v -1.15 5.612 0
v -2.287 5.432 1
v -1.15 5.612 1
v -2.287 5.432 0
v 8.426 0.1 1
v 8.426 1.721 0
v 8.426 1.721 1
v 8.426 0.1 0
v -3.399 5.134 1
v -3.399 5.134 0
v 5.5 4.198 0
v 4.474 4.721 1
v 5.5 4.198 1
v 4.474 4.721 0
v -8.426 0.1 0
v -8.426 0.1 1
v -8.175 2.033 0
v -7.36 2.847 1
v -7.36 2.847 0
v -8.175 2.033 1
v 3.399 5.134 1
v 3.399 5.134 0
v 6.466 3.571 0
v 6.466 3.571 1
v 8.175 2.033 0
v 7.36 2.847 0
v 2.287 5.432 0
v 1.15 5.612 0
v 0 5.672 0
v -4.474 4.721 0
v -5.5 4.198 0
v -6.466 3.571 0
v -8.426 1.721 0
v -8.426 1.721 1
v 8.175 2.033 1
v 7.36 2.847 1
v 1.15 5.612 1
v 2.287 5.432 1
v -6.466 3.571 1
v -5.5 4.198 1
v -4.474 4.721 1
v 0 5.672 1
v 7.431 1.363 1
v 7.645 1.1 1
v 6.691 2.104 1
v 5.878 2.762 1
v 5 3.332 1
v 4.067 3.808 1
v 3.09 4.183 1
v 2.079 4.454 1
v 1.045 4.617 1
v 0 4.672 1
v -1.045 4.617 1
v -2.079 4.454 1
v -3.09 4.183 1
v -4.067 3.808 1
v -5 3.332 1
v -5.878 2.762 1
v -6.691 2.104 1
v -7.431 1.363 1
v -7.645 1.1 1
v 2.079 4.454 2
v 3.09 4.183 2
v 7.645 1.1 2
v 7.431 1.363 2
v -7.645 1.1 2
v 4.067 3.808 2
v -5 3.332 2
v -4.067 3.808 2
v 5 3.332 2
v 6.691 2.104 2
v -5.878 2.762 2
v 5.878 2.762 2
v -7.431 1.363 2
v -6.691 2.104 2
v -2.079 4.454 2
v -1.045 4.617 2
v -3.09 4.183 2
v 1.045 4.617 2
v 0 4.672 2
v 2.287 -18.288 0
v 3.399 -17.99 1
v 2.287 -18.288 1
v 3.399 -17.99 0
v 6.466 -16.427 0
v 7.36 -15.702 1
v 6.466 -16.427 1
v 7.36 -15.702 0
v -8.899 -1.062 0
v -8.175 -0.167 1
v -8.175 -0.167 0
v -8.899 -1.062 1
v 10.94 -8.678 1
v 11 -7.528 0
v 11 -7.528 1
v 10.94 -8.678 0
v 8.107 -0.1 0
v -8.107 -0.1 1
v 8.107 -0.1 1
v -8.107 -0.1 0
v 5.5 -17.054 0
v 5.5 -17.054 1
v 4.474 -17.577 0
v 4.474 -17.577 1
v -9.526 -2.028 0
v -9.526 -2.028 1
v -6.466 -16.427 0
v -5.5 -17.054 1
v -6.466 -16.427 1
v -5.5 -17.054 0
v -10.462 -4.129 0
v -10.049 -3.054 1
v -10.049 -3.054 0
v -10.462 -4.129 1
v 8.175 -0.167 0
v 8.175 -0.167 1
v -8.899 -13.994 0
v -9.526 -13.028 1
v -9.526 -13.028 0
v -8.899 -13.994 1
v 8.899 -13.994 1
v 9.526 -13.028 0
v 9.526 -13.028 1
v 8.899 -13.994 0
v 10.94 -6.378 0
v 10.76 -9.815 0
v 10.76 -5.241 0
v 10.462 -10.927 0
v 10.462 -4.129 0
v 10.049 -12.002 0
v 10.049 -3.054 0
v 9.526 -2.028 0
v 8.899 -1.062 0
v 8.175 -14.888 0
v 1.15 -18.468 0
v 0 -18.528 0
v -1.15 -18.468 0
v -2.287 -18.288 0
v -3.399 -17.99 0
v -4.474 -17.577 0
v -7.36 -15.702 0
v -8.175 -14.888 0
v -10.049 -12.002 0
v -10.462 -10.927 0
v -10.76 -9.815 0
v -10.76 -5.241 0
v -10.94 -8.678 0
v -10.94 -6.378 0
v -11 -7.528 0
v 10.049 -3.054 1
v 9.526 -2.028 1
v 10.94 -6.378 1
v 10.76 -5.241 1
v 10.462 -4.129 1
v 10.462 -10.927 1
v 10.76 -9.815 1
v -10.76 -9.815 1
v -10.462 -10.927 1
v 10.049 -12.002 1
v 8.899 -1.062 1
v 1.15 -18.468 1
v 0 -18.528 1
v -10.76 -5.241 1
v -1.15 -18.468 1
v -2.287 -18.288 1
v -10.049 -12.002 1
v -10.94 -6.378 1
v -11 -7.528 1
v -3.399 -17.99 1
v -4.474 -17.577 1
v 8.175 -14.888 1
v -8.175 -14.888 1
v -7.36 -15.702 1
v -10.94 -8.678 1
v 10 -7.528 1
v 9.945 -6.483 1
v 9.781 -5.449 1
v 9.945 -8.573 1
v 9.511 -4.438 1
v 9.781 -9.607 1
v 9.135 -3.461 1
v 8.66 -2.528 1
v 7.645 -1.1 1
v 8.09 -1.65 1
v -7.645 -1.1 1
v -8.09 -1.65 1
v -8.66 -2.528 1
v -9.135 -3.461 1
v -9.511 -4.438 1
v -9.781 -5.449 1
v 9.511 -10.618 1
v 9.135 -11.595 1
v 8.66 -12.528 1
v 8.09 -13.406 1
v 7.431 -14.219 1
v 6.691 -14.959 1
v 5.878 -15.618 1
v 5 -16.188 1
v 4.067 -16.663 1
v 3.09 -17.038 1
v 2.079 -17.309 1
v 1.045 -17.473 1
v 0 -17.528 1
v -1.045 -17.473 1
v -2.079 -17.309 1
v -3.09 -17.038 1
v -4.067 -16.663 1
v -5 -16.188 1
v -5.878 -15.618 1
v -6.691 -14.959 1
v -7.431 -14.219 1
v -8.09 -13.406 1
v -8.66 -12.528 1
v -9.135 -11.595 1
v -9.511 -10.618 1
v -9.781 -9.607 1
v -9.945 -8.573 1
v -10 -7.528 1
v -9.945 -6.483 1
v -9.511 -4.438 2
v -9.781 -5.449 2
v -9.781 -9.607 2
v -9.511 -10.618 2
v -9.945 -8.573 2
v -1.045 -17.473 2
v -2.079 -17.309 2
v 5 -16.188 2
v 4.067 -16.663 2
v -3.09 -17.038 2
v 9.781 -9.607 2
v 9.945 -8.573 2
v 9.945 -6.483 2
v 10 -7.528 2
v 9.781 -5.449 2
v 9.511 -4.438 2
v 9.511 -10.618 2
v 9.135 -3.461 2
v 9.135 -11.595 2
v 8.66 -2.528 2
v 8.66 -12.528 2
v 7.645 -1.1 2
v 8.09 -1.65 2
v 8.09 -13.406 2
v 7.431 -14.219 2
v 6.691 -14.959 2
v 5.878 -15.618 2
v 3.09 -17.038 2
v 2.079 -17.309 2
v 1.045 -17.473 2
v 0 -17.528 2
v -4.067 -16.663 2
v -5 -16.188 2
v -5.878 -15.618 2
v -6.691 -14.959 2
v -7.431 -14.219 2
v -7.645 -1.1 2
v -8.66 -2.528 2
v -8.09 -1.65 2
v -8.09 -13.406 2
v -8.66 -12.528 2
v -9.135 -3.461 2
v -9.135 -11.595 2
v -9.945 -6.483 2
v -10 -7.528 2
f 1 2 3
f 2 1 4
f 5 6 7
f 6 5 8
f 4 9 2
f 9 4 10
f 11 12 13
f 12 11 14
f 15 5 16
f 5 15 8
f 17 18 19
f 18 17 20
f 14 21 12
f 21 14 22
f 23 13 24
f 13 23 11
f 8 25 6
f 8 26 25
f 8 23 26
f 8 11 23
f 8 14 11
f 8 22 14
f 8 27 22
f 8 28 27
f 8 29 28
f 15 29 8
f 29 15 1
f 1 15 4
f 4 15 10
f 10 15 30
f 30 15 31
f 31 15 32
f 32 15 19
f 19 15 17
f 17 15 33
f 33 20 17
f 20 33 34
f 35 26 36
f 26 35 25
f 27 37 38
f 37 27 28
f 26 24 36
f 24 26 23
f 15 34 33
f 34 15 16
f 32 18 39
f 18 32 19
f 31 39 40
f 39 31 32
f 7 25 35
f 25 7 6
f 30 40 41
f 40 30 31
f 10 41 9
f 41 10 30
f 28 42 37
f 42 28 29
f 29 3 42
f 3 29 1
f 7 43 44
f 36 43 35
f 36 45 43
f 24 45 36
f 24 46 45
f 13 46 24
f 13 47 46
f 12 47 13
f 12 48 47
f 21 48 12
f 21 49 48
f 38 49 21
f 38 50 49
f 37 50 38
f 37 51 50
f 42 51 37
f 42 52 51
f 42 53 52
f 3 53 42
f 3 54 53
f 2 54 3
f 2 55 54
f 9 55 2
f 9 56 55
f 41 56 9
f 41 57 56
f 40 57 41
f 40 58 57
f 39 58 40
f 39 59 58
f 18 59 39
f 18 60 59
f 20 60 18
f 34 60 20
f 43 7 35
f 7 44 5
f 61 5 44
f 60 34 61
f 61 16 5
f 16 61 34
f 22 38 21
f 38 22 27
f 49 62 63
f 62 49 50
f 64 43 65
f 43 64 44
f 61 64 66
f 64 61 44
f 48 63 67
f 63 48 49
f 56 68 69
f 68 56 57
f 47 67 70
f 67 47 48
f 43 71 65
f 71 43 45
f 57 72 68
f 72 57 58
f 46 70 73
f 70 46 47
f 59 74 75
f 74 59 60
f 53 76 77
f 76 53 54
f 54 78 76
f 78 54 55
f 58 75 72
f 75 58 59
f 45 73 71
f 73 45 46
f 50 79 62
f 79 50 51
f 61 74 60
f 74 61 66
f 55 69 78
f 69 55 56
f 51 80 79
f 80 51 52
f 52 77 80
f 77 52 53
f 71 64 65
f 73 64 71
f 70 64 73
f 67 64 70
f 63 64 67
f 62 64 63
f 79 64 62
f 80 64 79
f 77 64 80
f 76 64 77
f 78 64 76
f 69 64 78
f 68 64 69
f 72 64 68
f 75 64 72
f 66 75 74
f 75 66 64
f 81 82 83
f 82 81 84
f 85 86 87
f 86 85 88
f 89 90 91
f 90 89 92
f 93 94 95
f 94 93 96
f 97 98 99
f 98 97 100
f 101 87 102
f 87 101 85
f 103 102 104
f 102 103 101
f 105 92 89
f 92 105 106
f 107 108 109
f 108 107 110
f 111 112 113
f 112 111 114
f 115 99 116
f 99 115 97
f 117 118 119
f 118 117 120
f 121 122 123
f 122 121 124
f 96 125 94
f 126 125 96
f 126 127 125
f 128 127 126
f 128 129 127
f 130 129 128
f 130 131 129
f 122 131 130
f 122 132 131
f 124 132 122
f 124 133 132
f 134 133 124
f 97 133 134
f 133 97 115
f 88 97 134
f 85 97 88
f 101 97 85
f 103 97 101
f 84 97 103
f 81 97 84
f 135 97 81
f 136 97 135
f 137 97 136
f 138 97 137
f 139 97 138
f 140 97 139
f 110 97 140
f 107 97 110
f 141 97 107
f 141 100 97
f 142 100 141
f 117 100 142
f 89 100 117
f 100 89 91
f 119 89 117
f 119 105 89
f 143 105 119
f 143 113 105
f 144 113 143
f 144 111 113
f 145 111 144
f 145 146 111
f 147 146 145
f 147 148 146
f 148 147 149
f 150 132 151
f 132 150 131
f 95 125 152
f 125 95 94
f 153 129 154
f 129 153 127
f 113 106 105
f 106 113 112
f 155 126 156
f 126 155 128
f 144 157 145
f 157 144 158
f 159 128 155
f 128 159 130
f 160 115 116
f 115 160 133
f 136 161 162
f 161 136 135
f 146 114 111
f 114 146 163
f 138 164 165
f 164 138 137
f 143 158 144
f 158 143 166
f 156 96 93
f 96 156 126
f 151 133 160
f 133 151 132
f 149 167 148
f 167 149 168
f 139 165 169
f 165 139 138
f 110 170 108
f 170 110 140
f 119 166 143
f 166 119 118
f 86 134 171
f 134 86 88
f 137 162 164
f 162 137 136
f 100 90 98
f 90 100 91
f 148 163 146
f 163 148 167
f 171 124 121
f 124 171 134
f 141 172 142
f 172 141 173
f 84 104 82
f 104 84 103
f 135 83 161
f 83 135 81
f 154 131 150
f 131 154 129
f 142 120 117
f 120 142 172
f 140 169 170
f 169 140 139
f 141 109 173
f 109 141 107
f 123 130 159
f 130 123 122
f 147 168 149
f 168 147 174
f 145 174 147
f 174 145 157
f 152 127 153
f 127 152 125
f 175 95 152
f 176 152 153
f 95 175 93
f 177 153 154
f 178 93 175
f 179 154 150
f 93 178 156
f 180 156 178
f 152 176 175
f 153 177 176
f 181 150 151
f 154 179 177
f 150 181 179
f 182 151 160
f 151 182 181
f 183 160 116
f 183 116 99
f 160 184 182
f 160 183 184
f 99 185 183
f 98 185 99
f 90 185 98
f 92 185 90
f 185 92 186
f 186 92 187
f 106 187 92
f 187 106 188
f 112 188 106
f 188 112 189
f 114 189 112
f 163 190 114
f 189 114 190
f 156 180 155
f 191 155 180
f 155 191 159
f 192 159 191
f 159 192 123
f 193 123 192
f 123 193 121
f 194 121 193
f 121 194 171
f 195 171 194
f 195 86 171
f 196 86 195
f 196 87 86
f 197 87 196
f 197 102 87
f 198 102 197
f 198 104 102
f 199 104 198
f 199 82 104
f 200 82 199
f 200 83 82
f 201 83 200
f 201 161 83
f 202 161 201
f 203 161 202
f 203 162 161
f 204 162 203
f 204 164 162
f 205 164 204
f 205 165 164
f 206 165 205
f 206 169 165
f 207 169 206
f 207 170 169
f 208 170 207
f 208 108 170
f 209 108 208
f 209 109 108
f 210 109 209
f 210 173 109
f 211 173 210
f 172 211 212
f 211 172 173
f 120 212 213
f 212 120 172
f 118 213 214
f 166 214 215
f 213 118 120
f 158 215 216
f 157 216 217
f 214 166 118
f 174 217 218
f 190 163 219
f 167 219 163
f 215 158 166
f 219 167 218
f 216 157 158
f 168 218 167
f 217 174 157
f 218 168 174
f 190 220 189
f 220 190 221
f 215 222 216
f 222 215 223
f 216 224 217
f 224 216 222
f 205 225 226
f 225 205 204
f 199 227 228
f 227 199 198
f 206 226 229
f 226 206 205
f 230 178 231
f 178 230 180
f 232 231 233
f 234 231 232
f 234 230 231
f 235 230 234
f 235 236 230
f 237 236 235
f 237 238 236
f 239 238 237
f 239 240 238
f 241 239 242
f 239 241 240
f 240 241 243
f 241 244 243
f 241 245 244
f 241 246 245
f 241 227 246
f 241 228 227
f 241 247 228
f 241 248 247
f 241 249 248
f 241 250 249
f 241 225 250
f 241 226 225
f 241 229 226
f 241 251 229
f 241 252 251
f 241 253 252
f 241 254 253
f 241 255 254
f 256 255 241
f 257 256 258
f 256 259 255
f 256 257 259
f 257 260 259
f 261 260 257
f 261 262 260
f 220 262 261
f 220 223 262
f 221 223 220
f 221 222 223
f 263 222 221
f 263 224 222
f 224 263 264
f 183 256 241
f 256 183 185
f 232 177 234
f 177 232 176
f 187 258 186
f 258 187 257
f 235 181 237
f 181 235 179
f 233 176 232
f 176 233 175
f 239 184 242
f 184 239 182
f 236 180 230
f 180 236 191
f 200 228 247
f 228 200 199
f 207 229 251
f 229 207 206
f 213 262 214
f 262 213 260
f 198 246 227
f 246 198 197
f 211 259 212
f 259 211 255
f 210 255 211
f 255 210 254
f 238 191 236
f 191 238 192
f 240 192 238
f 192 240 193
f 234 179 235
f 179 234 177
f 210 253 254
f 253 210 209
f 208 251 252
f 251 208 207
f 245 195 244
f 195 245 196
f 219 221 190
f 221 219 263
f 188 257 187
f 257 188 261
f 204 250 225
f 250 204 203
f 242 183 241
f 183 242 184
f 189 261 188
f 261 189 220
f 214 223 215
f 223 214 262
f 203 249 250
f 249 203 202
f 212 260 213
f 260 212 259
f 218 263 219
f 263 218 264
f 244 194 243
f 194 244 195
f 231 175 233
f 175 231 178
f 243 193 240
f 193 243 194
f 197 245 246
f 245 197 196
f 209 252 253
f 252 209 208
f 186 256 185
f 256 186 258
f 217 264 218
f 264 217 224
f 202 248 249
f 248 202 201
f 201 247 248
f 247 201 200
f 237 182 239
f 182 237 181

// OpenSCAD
// Unit of length: Unit.MM
$fn = 60;
$vpr = [0.0, 0.0, 0.0];

union()
{
   translate(v = [0.0, 1.1])
   {
      union()
      {
         color(c = [1.0, 0.0, 0.0, 1.0])
         {
            linear_extrude(height = 1.0, center = false, twist = 0.0, scale = 1.0)
            {
               translate(v = [0.0, -6.4279])
               {
                  intersection()
                  {
                     circle(d = 22.0);
                     polygon(points = [[-8.4265, 5.4279], [-8.4265, 11.0], [8.4265, 11.0], [8.4265, 5.4279]]);
                  }
               }
            }
         }
         translate(v = [0.0, 0.0, 0.0])
         {
            linear_extrude(height = 2.0, center = false, twist = 0.0, scale = 1.0)
            {
               translate(v = [0.0, -6.4279])
               {
                  intersection()
                  {
                     circle(d = 20.0);
                     polygon(points = [[-7.6604, 6.4279], [-7.6604, 10.0], [7.6604, 10.0], [7.6604, 6.4279]]);
                  }
               }
            }
         }
      }
   }
   translate(v = [0.0, -1.1])
   {
      union()
      {
         color(c = [1.0, 0.0, 0.0, 1.0])
         {
            linear_extrude(height = 1.0, center = false, twist = 0.0, scale = 1.0)
            {
               translate(v = [0.0, -6.4279])
               {
                  intersection()
                  {
                     circle(d = 22.0);
                     polygon(points = [[-11.0, -11.0], [-11.0, 7.4279], [11.0, 7.4279], [11.0, -11.0]]);
                  }
               }
            }
         }
         translate(v = [0.0, 0.0, 0.0])
         {
            linear_extrude(height = 2.0, center = false, twist = 0.0, scale = 1.0)
            {
               translate(v = [0.0, -6.4279])
               {
                  intersection()
                  {
                     circle(d = 20.0);
                     polygon(points = [[-10.0, -10.0], [-10.0, 6.4279], [10.0, 6.4279], [10.0, -10.0]]);
                  }
               }
            }
         }
      }
   }
}
